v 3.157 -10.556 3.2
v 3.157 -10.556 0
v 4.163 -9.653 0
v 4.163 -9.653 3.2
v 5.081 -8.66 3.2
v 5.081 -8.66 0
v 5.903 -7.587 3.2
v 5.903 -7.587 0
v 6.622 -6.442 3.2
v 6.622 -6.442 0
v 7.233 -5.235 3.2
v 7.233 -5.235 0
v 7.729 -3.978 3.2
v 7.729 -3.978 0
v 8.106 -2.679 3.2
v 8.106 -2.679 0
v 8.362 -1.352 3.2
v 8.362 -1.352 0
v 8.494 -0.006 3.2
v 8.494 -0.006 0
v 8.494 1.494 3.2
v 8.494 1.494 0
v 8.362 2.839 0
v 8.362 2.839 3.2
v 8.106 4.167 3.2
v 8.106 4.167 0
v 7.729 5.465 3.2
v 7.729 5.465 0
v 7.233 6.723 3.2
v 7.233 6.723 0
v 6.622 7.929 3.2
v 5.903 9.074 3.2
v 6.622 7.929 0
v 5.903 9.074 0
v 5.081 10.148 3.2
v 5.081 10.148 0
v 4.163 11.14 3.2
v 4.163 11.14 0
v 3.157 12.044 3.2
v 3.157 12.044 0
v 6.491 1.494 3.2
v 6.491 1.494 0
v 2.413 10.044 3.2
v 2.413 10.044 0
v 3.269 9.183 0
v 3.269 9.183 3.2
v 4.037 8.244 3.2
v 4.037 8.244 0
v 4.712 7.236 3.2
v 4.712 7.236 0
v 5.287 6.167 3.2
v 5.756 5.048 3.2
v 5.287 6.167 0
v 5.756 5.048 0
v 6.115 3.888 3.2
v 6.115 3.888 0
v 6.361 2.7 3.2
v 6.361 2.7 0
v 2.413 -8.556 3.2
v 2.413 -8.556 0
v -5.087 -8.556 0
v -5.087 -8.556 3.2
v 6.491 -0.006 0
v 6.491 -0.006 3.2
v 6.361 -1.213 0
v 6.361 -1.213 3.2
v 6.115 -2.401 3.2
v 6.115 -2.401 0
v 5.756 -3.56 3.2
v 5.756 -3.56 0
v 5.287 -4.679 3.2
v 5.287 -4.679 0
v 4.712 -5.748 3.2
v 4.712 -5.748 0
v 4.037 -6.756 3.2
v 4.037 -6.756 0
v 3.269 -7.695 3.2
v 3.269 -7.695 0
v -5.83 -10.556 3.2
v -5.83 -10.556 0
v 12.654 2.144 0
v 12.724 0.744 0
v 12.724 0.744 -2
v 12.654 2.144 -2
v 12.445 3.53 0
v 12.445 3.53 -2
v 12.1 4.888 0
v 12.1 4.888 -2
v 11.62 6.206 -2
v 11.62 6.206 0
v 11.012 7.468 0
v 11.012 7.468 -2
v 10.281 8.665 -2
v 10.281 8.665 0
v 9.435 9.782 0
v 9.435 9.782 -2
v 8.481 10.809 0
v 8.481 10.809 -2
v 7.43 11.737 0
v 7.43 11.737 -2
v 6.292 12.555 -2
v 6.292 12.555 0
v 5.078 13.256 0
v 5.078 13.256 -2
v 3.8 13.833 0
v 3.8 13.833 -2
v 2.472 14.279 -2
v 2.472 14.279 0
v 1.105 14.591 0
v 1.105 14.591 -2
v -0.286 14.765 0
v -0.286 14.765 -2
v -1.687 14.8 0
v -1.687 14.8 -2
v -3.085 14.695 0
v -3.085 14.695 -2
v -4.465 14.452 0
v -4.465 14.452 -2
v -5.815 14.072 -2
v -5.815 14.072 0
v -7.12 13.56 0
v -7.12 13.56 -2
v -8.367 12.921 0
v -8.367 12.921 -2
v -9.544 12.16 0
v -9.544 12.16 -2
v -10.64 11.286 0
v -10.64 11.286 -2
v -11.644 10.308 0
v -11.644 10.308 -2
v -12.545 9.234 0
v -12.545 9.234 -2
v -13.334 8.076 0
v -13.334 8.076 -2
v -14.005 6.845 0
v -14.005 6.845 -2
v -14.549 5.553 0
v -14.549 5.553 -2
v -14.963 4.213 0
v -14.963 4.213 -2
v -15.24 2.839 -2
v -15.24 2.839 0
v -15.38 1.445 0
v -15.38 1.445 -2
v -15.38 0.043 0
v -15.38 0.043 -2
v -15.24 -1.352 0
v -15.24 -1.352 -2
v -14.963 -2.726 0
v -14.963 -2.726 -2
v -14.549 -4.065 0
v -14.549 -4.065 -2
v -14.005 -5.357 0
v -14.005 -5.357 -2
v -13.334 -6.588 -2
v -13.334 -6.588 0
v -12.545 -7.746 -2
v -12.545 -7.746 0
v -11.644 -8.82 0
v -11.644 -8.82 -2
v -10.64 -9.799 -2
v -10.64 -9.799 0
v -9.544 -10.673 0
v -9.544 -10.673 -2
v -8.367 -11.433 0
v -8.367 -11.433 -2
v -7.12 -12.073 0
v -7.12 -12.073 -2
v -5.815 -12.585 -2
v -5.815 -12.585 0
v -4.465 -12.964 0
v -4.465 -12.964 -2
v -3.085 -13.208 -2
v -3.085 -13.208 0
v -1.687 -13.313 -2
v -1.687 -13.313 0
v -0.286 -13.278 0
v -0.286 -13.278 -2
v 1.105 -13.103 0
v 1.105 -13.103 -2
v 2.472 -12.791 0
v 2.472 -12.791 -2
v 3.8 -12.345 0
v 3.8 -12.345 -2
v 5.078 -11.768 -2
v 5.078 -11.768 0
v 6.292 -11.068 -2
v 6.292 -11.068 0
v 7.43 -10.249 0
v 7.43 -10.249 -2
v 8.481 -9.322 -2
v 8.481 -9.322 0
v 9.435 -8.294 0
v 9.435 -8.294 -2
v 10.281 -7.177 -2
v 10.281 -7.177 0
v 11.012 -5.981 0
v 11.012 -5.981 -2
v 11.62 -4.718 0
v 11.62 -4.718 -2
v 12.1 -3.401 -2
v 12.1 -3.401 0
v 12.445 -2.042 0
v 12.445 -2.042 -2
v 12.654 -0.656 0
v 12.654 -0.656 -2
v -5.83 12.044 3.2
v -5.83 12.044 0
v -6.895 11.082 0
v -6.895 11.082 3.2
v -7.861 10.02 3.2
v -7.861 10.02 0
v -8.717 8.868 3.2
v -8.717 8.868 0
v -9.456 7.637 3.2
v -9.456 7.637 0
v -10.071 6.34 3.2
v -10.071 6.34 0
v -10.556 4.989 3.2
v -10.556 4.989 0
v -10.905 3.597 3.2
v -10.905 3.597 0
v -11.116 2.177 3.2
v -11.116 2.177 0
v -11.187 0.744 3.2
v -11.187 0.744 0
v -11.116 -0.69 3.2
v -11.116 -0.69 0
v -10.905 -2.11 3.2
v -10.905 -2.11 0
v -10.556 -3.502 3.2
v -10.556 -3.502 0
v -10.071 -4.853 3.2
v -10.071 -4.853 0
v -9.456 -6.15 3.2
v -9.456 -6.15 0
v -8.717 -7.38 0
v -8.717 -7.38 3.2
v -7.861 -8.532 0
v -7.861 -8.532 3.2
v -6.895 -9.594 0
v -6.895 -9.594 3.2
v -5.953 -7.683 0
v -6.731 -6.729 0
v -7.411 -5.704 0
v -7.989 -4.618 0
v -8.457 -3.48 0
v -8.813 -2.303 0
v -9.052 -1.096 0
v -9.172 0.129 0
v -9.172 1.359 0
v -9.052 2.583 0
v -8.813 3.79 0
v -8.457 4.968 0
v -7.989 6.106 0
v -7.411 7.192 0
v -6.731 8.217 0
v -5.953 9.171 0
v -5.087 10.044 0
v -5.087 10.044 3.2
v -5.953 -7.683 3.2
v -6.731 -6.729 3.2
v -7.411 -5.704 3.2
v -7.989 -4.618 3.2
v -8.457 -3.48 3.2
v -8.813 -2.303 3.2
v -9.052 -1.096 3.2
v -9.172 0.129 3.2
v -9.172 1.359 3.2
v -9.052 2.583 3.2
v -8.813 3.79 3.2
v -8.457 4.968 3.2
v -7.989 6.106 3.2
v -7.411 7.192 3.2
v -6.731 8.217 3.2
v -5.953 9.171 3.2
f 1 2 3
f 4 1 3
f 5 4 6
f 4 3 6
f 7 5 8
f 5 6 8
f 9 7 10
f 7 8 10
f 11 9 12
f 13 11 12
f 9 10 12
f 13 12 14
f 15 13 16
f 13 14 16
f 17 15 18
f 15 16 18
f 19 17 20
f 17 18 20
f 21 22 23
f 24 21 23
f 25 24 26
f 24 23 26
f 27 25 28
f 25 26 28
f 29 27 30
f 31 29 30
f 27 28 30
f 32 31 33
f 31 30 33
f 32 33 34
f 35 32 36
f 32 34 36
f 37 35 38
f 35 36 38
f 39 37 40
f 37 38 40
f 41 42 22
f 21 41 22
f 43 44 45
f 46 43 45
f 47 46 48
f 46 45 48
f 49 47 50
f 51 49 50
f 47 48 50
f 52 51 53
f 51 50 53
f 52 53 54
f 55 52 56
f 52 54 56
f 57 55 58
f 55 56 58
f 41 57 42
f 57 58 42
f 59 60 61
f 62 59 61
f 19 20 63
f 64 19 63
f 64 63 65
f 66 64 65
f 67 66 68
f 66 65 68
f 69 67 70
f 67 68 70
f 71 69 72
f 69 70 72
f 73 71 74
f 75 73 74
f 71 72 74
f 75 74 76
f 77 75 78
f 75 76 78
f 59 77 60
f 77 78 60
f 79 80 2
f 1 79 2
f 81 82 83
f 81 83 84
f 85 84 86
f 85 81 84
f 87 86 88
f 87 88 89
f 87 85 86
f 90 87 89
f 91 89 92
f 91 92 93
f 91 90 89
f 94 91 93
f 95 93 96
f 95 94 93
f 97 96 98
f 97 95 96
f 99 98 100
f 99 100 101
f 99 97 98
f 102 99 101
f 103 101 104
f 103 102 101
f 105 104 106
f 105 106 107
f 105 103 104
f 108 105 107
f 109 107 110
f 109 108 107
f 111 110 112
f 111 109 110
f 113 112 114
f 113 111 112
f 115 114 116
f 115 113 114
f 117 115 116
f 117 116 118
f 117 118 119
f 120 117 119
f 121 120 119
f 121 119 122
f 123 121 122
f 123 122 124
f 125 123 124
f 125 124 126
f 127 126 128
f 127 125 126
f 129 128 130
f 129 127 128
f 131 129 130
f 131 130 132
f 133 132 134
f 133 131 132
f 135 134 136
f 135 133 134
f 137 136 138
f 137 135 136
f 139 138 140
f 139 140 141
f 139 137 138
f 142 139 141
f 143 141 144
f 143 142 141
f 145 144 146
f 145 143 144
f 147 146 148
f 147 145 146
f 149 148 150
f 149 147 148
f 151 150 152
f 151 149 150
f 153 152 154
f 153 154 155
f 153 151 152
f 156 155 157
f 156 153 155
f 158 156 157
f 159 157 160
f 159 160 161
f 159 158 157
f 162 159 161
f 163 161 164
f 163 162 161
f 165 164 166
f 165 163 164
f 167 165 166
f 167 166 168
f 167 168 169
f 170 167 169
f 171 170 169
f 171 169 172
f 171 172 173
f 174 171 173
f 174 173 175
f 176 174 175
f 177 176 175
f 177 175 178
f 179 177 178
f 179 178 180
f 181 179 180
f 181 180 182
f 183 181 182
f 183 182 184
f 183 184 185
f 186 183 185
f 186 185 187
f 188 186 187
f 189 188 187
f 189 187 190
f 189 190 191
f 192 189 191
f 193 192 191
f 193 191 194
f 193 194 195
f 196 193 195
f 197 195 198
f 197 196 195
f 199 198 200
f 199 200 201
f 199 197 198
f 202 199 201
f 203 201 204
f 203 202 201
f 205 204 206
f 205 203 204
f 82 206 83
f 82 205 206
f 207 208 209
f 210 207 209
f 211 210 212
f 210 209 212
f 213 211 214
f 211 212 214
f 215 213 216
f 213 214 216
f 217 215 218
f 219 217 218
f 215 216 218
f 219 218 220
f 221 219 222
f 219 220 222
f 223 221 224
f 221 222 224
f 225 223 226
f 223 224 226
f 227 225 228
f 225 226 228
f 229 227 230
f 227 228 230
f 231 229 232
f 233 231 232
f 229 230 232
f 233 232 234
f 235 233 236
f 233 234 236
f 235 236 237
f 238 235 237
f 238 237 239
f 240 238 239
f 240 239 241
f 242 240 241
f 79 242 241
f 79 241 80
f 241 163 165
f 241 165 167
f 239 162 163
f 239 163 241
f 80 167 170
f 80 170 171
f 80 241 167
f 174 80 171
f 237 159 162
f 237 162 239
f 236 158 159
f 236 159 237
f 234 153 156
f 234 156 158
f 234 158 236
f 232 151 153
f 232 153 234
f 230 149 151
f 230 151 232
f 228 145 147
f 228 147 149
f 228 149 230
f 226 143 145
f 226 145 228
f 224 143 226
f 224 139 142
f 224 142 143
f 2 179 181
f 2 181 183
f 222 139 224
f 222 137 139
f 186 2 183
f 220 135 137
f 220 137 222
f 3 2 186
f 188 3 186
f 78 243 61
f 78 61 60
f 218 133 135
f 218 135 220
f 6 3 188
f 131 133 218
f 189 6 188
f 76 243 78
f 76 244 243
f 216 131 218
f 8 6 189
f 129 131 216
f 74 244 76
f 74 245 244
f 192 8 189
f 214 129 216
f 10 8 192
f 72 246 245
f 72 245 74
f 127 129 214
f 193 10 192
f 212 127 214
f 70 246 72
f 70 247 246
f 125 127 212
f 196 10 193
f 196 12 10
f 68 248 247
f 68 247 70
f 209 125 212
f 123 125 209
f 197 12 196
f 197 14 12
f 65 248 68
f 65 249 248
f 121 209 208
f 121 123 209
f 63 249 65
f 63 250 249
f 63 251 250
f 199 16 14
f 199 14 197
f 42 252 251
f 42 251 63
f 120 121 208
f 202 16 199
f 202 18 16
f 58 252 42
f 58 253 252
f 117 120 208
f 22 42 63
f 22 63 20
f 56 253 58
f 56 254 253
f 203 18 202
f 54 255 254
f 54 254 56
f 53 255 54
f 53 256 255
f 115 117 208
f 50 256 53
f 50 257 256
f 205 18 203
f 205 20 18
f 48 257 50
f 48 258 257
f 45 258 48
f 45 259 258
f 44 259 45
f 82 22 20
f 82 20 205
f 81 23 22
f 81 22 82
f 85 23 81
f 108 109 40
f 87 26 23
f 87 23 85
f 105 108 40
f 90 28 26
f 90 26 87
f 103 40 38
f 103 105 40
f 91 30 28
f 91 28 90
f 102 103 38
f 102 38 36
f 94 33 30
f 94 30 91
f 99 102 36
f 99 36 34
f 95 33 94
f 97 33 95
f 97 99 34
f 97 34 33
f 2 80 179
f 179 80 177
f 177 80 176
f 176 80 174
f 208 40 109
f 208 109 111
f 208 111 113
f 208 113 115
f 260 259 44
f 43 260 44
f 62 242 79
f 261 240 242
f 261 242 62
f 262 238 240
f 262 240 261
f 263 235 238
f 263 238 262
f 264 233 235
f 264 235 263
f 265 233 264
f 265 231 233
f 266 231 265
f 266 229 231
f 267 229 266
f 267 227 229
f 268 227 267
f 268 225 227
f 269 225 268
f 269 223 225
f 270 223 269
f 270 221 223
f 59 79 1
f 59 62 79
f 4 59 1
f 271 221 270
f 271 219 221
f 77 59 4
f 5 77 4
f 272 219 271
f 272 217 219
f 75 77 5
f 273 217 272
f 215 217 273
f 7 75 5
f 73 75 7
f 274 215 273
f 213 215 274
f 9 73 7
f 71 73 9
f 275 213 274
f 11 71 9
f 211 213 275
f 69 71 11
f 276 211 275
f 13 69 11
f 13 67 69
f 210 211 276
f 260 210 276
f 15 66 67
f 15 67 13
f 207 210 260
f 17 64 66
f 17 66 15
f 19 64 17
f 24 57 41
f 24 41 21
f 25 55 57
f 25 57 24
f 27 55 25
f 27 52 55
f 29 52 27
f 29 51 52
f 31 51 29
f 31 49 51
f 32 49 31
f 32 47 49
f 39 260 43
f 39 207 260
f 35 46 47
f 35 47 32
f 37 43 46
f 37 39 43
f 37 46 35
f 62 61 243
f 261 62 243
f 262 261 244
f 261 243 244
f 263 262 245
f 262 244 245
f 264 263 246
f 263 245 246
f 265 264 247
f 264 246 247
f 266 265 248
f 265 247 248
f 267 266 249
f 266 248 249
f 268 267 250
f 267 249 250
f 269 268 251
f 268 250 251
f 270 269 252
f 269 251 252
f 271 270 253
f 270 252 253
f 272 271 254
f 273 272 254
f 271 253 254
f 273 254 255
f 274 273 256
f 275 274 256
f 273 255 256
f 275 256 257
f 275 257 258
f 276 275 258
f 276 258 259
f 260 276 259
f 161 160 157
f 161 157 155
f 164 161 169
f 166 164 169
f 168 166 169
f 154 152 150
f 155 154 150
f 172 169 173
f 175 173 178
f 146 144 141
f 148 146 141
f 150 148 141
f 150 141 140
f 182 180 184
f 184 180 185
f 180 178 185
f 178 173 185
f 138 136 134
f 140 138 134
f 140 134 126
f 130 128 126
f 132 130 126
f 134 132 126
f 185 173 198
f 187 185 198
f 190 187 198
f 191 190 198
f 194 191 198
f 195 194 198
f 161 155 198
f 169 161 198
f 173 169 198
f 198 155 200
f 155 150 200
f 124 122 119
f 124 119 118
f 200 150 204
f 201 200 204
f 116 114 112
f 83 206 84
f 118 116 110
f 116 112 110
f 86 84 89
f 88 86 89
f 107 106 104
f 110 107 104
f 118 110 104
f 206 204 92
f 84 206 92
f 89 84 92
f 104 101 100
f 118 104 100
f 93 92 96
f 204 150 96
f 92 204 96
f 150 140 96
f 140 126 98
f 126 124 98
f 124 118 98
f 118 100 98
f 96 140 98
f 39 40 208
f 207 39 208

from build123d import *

# Parameters (mm, degrees)
F1_DEPTH = 3.2
F2_R     = 14.060754
F3_DEPTH = 2


with BuildPart() as f1:
    # F0 (on Top) → F1 (new body)
    with BuildSketch(Plane.XY):
        with BuildLine():
            ThreePointArc((-5.086545, -8.556186), (-9.186545, 0.743814), (-5.086545, 10.043814))
            Line((-5.086545, 10.043814), (2.413455, 10.043814))
            ThreePointArc((2.413455, 10.043814), (5.286519, 6.166676), (6.491109, 1.493814))
            Line((6.491109, 1.493814), (8.494175, 1.493814))
            ThreePointArc((8.494175, 1.493814), (6.941519, 7.333341), (3.15704, 12.043814))
            Line((3.15704, 12.043814), (-5.83013, 12.043814))
            ThreePointArc((-5.83013, 12.043814), (-11.186545, 0.743814), (-5.83013, -10.556186))
            Line((-5.83013, -10.556186), (3.15704, -10.556186))
            ThreePointArc((3.15704, -10.556186), (6.941519, -5.845714), (8.494175, -0.006186))
            Line((8.494175, -0.006186), (6.491109, -0.006186))
            ThreePointArc((6.491109, -0.006186), (5.286519, -4.679049), (2.413455, -8.556186))
            Line((2.413455, -8.556186), (-5.086545, -8.556186))
        make_face()
    extrude(amount=F1_DEPTH)

    # F2 (on Top) → F3 (join)
    with BuildSketch(Plane.XY):
        with Locations((-1.336545, 0.743814)):
            Circle(F2_R)
    extrude(amount=-F3_DEPTH)


solid = f1.part
